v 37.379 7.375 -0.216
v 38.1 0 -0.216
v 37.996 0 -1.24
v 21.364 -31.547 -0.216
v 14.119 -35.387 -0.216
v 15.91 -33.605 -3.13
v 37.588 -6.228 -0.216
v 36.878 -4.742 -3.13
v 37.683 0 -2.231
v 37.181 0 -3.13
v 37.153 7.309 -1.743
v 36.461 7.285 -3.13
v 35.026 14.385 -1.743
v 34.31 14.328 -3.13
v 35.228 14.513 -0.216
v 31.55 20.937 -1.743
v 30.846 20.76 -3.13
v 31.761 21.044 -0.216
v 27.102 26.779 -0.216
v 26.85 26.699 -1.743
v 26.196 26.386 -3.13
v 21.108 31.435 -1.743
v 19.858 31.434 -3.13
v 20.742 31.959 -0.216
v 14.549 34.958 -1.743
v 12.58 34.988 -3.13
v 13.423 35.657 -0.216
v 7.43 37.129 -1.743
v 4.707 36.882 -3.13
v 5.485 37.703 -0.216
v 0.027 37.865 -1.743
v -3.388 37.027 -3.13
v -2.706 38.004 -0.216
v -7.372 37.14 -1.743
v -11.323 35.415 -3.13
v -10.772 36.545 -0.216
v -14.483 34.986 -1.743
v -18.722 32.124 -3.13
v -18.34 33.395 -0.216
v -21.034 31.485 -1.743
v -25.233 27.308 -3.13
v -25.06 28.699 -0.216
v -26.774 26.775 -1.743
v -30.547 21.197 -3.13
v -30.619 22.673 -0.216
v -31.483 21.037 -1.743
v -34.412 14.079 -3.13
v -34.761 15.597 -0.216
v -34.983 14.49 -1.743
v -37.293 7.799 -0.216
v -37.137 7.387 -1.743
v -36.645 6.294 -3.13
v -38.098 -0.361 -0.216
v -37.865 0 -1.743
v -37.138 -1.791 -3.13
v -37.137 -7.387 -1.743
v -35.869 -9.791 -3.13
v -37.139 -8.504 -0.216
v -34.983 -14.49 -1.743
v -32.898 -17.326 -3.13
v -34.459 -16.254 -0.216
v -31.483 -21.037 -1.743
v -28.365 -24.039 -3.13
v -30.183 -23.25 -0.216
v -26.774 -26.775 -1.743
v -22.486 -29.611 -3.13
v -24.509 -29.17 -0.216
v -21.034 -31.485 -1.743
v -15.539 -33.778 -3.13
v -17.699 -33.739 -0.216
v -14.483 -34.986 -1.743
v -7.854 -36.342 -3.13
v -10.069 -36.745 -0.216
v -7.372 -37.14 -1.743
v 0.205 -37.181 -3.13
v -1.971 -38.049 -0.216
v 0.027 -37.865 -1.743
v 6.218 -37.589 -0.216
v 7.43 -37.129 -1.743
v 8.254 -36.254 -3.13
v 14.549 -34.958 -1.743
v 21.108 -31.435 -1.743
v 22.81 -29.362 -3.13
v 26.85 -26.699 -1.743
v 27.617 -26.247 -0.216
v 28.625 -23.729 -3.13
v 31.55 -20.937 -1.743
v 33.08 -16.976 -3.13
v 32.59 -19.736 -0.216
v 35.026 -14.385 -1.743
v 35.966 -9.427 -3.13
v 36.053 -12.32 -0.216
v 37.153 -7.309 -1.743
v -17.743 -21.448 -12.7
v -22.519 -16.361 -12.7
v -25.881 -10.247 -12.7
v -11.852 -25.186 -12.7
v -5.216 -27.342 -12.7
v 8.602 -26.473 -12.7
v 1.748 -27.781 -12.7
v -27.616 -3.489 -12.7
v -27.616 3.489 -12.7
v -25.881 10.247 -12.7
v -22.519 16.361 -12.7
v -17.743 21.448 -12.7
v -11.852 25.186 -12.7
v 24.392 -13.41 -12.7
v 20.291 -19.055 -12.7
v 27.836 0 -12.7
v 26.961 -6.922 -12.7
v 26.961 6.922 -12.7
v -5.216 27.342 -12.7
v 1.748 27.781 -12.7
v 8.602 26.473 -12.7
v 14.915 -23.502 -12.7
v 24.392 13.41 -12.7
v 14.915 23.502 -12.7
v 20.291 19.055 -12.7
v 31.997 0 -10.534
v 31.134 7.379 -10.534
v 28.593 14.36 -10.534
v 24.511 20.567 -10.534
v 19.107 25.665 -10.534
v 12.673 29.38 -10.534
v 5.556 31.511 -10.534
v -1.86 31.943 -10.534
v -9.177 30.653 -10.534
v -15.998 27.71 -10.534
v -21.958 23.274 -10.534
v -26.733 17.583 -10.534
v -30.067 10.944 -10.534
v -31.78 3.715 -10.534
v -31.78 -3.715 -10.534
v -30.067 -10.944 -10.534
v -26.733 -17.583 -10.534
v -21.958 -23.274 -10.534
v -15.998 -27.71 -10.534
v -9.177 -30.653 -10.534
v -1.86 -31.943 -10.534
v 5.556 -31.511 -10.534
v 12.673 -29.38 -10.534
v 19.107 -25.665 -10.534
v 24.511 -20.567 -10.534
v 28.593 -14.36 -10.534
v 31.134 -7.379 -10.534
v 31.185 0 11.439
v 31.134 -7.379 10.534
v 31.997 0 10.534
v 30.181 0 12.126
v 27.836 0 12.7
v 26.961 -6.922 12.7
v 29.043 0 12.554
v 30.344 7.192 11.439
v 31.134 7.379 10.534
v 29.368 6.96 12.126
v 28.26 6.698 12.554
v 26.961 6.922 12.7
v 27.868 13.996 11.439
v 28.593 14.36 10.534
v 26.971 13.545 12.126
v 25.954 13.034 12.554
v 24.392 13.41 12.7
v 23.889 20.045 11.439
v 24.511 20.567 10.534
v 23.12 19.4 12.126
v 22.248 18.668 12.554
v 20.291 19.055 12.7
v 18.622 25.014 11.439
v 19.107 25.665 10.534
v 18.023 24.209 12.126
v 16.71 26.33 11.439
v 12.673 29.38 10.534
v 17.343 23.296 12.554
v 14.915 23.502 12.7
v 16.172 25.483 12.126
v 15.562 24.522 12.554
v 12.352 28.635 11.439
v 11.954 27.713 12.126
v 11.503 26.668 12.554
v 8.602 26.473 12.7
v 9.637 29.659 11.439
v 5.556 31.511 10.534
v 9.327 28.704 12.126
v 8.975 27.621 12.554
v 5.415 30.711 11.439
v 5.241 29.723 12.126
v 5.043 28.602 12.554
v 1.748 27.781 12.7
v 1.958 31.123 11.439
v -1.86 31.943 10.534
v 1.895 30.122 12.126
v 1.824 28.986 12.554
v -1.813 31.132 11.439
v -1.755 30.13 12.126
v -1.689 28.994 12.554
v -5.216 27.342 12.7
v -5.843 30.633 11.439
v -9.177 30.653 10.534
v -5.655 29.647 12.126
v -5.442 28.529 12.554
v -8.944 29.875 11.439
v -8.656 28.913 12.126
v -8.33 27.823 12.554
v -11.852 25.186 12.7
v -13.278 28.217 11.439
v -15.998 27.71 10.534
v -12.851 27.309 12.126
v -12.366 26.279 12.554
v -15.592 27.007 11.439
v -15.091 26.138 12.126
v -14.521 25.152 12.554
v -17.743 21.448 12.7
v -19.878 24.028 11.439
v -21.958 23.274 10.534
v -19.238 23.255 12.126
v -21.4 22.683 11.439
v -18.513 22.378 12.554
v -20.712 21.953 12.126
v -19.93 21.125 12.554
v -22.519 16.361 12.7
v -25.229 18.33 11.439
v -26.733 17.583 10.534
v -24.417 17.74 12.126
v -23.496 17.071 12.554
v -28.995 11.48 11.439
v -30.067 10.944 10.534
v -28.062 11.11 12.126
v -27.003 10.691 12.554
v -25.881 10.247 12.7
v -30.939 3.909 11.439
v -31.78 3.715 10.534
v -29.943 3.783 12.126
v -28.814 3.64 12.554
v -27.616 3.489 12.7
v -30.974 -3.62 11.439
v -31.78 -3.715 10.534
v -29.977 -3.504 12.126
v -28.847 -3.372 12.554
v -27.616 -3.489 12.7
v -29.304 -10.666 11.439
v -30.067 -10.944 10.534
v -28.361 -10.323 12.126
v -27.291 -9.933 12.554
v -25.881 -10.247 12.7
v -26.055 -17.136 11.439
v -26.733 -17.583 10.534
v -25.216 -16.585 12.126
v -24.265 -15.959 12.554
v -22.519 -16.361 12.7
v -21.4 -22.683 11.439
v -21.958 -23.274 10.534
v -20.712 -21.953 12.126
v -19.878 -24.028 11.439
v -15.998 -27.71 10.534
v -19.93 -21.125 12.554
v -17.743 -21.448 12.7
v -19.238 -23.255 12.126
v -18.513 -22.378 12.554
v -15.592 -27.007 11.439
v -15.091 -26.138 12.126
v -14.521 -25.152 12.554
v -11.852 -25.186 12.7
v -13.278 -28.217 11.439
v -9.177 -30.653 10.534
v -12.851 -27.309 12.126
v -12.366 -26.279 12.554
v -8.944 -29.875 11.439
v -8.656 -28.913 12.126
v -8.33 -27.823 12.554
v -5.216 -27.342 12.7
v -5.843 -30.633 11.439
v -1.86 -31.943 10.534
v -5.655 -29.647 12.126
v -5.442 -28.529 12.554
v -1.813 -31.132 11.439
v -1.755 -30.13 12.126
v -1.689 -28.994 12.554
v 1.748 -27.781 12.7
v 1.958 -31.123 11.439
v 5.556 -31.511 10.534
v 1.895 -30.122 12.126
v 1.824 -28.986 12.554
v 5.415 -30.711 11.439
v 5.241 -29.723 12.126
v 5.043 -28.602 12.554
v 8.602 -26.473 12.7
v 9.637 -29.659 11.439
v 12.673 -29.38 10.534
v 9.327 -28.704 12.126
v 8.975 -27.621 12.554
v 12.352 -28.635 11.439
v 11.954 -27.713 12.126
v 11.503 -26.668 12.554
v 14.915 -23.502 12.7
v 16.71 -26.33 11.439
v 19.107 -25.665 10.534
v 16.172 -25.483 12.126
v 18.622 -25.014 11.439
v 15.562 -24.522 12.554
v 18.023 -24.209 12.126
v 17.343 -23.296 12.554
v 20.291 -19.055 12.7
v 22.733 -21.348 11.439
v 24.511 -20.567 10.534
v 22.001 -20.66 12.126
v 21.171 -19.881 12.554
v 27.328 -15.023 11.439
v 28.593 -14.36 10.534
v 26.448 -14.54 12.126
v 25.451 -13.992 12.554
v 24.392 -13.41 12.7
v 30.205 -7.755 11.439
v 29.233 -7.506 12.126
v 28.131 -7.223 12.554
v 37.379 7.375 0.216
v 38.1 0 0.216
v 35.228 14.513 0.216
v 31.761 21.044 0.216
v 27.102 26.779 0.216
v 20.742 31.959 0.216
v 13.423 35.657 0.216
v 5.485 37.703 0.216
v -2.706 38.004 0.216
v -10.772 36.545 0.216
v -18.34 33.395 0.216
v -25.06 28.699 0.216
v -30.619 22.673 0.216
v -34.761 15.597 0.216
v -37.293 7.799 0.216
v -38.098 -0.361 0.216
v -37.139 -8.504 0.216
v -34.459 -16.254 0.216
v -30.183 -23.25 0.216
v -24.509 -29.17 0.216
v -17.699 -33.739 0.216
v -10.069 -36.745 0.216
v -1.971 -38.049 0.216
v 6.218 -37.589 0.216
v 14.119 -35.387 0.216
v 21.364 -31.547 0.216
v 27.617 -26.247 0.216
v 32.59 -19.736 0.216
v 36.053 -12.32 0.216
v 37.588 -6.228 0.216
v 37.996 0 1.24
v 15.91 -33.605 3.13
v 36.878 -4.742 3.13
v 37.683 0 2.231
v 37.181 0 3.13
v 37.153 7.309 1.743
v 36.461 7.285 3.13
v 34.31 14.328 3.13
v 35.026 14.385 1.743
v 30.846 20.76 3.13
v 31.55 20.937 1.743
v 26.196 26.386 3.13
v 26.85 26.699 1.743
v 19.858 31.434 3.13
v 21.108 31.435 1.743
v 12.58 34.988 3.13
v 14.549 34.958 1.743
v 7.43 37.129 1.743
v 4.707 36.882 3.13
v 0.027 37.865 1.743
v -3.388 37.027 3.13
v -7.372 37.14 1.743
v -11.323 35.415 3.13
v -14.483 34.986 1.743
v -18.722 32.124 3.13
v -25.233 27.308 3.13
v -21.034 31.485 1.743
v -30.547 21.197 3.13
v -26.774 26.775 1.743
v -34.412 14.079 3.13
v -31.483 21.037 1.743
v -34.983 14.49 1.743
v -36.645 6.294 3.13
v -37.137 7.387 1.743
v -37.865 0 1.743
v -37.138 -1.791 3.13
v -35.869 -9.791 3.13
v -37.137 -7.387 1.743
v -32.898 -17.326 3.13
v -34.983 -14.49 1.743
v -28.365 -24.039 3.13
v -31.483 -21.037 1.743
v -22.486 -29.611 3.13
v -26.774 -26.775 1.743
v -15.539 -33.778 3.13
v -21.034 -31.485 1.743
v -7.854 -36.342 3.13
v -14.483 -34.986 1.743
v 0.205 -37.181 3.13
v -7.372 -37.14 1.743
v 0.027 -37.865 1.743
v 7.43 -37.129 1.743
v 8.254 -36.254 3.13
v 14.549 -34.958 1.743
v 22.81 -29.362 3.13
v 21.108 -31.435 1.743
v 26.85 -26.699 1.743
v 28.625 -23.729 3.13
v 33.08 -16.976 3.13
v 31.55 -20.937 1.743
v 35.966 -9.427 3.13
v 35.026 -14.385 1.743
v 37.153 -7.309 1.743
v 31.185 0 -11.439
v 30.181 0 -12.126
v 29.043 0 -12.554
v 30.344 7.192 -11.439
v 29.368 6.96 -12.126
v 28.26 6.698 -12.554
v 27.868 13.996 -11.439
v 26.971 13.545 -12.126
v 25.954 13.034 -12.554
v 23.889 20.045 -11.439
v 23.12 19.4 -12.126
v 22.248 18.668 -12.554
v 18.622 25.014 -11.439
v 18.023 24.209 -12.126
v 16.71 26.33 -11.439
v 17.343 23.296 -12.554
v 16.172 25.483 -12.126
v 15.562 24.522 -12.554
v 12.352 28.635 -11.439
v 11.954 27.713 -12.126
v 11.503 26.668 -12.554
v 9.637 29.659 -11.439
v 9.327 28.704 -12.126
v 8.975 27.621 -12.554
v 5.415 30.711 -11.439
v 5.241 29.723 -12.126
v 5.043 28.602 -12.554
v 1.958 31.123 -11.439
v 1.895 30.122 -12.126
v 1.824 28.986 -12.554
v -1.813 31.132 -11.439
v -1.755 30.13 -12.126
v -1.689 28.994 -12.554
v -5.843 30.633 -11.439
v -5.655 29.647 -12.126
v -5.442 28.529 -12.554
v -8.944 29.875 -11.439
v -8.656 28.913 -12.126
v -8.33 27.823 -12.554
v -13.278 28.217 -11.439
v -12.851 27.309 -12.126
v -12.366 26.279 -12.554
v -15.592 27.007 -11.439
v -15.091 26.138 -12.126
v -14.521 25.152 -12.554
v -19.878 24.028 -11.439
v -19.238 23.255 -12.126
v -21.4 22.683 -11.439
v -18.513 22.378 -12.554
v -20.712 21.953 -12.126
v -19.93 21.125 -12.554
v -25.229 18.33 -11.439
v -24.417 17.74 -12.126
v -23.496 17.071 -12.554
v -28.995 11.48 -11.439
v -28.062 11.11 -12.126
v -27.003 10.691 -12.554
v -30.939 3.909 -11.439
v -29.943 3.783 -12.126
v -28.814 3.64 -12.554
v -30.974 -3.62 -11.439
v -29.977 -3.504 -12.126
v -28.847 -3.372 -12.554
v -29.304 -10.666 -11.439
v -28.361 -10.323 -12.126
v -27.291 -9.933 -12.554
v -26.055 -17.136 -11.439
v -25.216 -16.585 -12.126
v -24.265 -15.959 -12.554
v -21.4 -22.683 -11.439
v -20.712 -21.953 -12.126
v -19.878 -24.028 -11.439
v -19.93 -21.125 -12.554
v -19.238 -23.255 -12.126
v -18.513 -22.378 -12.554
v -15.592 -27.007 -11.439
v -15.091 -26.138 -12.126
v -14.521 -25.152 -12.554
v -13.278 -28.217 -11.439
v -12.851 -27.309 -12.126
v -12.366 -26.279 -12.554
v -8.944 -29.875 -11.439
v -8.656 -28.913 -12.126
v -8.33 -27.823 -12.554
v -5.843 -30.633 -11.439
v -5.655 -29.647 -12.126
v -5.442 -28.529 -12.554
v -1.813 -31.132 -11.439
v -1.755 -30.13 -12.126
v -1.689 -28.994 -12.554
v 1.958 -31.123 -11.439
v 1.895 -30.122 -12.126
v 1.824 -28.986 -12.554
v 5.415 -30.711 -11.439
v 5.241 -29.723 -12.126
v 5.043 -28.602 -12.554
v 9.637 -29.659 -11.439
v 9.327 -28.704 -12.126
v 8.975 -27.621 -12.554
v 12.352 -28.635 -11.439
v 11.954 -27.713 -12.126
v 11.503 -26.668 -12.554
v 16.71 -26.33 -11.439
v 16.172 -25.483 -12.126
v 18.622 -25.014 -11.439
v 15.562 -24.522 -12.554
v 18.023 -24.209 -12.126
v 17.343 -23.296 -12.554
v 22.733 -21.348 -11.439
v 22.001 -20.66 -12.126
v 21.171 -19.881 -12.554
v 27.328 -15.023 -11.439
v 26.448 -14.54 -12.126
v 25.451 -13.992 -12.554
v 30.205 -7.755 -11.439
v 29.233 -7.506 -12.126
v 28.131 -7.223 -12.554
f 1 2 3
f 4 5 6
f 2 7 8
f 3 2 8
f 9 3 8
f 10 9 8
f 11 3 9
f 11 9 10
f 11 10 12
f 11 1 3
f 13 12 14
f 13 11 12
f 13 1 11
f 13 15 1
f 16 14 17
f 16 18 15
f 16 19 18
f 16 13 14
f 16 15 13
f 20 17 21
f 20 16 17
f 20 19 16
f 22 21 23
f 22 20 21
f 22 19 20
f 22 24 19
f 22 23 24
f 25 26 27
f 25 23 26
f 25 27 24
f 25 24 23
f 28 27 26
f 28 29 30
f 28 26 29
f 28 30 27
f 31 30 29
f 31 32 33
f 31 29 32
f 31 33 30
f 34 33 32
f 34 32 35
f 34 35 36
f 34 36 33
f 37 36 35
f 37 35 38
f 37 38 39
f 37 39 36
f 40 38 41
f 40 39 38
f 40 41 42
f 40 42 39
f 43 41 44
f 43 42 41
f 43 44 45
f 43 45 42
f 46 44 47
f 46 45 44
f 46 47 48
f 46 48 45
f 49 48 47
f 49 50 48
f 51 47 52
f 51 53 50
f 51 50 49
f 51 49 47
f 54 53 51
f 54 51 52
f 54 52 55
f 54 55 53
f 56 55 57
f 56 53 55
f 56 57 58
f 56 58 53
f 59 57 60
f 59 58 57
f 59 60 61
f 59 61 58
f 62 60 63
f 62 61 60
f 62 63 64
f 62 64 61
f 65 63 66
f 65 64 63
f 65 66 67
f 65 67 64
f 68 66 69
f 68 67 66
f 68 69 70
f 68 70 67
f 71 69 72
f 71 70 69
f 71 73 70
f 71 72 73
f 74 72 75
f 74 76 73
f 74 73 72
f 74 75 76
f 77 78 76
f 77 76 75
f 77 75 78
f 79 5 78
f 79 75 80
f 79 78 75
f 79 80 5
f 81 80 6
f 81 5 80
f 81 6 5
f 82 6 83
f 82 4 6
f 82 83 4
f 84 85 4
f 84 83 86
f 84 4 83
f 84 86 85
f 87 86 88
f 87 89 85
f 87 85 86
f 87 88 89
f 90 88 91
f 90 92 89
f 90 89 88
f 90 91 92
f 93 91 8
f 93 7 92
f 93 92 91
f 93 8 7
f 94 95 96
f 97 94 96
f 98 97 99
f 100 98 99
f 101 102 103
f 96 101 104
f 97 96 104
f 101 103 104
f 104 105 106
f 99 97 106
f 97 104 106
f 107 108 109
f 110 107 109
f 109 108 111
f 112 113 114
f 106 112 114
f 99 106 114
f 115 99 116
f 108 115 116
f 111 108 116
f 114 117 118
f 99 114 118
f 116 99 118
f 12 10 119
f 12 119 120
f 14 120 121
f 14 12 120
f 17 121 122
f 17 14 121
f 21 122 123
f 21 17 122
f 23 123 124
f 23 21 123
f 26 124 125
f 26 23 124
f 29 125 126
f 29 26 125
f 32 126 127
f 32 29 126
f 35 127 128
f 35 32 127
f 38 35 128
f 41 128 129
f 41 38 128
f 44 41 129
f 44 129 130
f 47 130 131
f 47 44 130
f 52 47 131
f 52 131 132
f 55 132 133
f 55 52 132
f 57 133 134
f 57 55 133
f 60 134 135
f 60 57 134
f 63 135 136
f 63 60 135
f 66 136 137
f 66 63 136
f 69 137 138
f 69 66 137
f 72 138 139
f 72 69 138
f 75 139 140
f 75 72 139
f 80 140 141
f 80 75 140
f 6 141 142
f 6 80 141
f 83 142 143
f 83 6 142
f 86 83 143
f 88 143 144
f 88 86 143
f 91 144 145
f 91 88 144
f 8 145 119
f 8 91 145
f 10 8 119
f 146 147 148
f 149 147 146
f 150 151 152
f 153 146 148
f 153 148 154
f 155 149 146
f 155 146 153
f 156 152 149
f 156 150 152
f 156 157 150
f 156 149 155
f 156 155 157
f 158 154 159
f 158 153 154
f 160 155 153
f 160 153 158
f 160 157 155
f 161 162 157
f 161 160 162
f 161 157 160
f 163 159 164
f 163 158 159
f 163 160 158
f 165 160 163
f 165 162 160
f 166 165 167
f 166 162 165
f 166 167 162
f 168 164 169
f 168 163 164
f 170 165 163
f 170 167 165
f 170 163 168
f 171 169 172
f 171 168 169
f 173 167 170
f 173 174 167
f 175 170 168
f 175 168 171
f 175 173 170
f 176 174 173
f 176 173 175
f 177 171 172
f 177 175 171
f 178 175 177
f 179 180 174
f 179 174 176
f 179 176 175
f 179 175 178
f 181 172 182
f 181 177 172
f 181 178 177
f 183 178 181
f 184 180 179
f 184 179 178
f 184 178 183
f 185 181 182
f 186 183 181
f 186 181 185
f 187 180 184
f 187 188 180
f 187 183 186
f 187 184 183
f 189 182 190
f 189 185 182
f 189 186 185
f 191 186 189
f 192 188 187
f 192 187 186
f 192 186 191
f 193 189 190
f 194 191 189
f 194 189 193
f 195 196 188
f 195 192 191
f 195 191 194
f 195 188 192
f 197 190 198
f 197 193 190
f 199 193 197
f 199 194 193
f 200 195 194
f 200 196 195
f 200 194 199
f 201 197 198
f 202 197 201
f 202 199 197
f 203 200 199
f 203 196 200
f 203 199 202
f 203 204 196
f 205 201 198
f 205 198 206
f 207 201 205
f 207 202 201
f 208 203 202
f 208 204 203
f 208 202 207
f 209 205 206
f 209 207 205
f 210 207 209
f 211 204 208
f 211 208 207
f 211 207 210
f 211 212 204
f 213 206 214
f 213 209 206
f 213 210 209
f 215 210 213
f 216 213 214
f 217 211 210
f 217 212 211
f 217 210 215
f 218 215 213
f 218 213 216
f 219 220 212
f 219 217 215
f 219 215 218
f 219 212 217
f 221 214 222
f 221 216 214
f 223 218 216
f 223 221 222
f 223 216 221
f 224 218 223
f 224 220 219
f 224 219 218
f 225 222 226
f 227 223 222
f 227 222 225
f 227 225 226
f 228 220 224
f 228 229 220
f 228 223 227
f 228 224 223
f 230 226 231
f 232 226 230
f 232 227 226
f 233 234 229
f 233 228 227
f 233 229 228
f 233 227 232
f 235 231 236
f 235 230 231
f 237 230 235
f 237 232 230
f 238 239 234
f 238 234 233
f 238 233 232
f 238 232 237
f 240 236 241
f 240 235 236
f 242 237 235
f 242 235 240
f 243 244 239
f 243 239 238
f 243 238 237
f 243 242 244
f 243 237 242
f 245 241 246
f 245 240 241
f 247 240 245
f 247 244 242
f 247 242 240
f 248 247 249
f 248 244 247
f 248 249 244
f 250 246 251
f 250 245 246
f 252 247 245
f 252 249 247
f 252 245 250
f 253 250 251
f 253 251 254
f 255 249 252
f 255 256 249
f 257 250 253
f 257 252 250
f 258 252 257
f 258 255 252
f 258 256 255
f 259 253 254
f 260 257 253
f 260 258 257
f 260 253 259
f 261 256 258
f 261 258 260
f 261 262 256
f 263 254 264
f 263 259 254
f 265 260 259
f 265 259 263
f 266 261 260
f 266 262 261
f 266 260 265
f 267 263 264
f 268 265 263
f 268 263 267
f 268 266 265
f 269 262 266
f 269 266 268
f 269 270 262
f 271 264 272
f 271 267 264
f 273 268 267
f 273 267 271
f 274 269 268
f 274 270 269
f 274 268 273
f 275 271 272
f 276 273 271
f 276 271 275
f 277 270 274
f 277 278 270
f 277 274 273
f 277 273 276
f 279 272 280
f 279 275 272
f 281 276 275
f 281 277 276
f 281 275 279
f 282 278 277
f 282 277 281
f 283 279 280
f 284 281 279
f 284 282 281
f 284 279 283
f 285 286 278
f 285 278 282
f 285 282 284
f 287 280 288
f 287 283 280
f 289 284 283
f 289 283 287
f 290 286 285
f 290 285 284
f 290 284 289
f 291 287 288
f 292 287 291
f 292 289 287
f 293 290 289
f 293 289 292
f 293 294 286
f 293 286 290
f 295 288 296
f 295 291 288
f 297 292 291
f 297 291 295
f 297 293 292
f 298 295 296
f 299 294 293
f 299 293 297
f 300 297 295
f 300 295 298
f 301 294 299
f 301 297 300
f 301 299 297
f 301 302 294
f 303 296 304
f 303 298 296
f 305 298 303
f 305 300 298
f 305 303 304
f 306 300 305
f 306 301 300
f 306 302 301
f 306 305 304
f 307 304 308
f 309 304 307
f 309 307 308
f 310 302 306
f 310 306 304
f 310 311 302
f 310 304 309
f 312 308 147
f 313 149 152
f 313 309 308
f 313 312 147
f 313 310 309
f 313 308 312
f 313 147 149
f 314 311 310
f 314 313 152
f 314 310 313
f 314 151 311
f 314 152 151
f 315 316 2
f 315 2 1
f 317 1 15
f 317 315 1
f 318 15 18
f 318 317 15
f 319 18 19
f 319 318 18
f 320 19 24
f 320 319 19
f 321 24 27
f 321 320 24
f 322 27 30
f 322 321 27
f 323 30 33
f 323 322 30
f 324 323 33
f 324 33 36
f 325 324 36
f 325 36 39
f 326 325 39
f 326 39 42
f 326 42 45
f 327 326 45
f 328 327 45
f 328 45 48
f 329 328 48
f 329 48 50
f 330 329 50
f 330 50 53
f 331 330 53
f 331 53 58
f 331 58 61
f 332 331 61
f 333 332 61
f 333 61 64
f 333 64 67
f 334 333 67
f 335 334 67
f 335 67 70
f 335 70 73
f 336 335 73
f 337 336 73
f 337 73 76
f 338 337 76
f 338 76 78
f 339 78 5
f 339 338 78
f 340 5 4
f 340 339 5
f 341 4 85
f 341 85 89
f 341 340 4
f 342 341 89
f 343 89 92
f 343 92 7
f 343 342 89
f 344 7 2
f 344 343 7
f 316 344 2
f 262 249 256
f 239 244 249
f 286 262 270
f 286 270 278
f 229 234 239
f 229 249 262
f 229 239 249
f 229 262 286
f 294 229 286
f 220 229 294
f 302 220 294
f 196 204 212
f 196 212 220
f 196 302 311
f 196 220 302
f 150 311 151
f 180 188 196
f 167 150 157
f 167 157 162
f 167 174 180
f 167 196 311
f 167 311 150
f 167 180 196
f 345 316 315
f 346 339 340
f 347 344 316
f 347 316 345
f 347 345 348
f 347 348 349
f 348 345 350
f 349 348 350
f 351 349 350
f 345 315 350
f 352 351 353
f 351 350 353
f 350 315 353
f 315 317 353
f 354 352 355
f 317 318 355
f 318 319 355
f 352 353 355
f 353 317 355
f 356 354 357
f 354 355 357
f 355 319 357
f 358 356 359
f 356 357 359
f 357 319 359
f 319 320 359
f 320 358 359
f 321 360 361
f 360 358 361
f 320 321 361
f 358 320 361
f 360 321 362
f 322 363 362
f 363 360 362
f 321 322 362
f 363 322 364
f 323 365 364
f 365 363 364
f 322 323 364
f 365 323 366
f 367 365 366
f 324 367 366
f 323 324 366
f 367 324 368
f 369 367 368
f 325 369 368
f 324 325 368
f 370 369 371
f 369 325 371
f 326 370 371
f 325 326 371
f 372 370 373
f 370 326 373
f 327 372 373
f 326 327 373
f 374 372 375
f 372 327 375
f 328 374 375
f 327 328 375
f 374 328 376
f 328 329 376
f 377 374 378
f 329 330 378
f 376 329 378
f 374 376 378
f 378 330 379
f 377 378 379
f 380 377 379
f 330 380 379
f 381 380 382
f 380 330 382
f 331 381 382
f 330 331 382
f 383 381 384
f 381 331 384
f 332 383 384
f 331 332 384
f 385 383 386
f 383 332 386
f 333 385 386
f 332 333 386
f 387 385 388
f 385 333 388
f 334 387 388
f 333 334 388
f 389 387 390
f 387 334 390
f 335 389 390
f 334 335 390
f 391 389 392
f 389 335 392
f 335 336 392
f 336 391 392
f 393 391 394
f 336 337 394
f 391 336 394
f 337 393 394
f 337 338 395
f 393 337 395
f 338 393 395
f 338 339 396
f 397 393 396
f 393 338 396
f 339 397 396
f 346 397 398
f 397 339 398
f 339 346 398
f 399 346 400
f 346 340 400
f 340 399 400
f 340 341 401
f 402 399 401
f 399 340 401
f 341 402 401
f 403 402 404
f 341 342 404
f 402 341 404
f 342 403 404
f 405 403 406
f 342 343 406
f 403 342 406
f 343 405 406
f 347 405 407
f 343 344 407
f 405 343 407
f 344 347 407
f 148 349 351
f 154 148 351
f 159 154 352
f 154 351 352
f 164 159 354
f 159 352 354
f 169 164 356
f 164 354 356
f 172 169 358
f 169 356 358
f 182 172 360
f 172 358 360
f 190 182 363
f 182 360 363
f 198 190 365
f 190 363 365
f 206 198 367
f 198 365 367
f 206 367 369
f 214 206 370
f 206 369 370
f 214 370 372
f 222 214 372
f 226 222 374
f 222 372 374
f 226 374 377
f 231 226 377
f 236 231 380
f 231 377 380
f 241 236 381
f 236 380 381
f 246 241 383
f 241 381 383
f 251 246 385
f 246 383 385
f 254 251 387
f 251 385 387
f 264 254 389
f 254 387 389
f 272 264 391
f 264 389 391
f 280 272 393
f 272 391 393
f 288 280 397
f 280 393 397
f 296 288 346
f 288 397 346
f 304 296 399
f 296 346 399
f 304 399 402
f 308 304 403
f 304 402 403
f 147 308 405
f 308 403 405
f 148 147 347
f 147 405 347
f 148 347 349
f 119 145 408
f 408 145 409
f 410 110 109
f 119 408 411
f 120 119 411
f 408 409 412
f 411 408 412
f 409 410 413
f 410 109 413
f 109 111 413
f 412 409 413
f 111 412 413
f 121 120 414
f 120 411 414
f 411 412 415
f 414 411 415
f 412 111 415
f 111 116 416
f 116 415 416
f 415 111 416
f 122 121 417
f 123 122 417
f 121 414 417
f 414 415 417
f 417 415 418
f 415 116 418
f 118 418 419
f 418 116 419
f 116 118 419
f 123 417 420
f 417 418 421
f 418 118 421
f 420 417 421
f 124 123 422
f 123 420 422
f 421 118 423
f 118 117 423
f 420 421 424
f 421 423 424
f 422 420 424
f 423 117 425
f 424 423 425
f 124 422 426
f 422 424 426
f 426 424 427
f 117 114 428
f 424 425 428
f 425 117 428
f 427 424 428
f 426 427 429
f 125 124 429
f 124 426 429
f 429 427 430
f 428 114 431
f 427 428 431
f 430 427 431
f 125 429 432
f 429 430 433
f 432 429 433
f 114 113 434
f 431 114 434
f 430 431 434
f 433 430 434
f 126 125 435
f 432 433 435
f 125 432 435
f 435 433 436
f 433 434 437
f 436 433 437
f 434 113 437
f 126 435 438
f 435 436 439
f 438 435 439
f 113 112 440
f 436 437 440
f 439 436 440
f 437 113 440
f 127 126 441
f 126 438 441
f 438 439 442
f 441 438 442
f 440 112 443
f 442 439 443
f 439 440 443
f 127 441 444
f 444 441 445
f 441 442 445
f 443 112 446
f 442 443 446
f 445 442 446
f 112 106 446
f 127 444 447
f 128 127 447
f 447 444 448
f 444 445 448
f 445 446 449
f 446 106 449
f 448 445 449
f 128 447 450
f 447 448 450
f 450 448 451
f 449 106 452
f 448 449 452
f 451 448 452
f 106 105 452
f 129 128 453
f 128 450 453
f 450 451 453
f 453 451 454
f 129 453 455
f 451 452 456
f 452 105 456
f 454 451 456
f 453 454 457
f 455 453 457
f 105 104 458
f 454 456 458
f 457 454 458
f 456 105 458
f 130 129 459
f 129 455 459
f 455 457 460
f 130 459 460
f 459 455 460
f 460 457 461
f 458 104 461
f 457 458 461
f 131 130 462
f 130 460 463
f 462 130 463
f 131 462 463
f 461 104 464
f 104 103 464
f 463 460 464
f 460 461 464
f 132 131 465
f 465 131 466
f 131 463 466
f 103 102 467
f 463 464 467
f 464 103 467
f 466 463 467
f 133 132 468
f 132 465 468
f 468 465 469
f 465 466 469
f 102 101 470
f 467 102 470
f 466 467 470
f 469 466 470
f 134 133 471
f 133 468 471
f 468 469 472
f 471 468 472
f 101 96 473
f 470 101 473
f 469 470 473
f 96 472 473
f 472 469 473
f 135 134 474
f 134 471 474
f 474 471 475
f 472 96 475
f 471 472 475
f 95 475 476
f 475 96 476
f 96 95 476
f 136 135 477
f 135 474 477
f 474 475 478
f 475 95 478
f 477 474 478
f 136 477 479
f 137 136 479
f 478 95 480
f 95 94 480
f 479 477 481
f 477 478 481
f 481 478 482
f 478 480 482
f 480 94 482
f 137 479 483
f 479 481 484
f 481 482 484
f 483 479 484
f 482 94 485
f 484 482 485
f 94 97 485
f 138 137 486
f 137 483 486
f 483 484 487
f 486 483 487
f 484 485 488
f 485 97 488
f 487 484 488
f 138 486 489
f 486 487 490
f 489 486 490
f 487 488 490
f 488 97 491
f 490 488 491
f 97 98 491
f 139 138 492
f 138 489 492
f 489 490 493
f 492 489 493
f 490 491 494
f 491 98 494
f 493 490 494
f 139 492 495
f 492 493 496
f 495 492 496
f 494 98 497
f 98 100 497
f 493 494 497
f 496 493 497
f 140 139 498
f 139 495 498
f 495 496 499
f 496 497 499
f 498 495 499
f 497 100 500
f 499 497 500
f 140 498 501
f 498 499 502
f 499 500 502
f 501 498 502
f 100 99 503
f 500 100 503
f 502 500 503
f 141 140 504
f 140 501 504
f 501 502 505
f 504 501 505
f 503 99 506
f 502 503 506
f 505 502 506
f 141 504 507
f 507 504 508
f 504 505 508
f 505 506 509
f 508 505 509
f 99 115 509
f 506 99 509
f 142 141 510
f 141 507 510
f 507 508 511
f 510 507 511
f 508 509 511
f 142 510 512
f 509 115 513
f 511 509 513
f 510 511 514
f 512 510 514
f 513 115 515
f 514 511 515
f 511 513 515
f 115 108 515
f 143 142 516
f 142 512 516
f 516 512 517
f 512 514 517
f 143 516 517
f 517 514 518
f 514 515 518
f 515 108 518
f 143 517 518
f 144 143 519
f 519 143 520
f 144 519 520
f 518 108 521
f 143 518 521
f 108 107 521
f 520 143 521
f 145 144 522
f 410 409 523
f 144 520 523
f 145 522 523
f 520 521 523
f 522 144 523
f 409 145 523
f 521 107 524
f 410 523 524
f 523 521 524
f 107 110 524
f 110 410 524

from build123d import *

# Parameters (mm, degrees)
F0_R       = 38.1
F1_DEPTH   = 12.7
F2_SIZE2   = 10.8824878114
F2_SIZE    = 7.62
F2_2_SIZE2 = 10.8824878114
F2_2_SIZE  = 7.62
F3_R       = 5.08


with BuildPart() as f1:
    # F0 (on Top) → F1 (new body, symmetric)
    with BuildSketch(Plane.XY):
        Circle(F0_R)
    extrude(amount=F1_DEPTH, both=True)

    # F2
    f2_edges = [f1.edges().sort_by_distance(p)[0] for p in [
        (-38.1, 0, 12.7),
    ]]
    f2_side = f1.faces().sort_by_distance((0, 0, 12.7))[0]
    chamfer(f2_edges, length=F2_SIZE, length2=F2_SIZE2, reference=f2_side)

    # F2#2
    f2_2_edges = [f1.edges().sort_by_distance(p)[0] for p in [
        (-38.1, 0, -12.7),
    ]]
    f2_2_side = f1.faces().sort_by_distance((0, 0, -12.7))[0]
    chamfer(f2_2_edges, length=F2_2_SIZE, length2=F2_2_SIZE2, reference=f2_2_side)

    # F3
    f3_edges = [f1.edges().sort_by_distance(p)[0] for p in [
        (-38.1, 0, 1.817512),
        (-30.48, 0, 12.7),
        (-38.1, 0, -1.817512),
        (-30.48, 0, -12.7),
    ]]
    fillet(f3_edges, radius=F3_R)


solid = f1.part
